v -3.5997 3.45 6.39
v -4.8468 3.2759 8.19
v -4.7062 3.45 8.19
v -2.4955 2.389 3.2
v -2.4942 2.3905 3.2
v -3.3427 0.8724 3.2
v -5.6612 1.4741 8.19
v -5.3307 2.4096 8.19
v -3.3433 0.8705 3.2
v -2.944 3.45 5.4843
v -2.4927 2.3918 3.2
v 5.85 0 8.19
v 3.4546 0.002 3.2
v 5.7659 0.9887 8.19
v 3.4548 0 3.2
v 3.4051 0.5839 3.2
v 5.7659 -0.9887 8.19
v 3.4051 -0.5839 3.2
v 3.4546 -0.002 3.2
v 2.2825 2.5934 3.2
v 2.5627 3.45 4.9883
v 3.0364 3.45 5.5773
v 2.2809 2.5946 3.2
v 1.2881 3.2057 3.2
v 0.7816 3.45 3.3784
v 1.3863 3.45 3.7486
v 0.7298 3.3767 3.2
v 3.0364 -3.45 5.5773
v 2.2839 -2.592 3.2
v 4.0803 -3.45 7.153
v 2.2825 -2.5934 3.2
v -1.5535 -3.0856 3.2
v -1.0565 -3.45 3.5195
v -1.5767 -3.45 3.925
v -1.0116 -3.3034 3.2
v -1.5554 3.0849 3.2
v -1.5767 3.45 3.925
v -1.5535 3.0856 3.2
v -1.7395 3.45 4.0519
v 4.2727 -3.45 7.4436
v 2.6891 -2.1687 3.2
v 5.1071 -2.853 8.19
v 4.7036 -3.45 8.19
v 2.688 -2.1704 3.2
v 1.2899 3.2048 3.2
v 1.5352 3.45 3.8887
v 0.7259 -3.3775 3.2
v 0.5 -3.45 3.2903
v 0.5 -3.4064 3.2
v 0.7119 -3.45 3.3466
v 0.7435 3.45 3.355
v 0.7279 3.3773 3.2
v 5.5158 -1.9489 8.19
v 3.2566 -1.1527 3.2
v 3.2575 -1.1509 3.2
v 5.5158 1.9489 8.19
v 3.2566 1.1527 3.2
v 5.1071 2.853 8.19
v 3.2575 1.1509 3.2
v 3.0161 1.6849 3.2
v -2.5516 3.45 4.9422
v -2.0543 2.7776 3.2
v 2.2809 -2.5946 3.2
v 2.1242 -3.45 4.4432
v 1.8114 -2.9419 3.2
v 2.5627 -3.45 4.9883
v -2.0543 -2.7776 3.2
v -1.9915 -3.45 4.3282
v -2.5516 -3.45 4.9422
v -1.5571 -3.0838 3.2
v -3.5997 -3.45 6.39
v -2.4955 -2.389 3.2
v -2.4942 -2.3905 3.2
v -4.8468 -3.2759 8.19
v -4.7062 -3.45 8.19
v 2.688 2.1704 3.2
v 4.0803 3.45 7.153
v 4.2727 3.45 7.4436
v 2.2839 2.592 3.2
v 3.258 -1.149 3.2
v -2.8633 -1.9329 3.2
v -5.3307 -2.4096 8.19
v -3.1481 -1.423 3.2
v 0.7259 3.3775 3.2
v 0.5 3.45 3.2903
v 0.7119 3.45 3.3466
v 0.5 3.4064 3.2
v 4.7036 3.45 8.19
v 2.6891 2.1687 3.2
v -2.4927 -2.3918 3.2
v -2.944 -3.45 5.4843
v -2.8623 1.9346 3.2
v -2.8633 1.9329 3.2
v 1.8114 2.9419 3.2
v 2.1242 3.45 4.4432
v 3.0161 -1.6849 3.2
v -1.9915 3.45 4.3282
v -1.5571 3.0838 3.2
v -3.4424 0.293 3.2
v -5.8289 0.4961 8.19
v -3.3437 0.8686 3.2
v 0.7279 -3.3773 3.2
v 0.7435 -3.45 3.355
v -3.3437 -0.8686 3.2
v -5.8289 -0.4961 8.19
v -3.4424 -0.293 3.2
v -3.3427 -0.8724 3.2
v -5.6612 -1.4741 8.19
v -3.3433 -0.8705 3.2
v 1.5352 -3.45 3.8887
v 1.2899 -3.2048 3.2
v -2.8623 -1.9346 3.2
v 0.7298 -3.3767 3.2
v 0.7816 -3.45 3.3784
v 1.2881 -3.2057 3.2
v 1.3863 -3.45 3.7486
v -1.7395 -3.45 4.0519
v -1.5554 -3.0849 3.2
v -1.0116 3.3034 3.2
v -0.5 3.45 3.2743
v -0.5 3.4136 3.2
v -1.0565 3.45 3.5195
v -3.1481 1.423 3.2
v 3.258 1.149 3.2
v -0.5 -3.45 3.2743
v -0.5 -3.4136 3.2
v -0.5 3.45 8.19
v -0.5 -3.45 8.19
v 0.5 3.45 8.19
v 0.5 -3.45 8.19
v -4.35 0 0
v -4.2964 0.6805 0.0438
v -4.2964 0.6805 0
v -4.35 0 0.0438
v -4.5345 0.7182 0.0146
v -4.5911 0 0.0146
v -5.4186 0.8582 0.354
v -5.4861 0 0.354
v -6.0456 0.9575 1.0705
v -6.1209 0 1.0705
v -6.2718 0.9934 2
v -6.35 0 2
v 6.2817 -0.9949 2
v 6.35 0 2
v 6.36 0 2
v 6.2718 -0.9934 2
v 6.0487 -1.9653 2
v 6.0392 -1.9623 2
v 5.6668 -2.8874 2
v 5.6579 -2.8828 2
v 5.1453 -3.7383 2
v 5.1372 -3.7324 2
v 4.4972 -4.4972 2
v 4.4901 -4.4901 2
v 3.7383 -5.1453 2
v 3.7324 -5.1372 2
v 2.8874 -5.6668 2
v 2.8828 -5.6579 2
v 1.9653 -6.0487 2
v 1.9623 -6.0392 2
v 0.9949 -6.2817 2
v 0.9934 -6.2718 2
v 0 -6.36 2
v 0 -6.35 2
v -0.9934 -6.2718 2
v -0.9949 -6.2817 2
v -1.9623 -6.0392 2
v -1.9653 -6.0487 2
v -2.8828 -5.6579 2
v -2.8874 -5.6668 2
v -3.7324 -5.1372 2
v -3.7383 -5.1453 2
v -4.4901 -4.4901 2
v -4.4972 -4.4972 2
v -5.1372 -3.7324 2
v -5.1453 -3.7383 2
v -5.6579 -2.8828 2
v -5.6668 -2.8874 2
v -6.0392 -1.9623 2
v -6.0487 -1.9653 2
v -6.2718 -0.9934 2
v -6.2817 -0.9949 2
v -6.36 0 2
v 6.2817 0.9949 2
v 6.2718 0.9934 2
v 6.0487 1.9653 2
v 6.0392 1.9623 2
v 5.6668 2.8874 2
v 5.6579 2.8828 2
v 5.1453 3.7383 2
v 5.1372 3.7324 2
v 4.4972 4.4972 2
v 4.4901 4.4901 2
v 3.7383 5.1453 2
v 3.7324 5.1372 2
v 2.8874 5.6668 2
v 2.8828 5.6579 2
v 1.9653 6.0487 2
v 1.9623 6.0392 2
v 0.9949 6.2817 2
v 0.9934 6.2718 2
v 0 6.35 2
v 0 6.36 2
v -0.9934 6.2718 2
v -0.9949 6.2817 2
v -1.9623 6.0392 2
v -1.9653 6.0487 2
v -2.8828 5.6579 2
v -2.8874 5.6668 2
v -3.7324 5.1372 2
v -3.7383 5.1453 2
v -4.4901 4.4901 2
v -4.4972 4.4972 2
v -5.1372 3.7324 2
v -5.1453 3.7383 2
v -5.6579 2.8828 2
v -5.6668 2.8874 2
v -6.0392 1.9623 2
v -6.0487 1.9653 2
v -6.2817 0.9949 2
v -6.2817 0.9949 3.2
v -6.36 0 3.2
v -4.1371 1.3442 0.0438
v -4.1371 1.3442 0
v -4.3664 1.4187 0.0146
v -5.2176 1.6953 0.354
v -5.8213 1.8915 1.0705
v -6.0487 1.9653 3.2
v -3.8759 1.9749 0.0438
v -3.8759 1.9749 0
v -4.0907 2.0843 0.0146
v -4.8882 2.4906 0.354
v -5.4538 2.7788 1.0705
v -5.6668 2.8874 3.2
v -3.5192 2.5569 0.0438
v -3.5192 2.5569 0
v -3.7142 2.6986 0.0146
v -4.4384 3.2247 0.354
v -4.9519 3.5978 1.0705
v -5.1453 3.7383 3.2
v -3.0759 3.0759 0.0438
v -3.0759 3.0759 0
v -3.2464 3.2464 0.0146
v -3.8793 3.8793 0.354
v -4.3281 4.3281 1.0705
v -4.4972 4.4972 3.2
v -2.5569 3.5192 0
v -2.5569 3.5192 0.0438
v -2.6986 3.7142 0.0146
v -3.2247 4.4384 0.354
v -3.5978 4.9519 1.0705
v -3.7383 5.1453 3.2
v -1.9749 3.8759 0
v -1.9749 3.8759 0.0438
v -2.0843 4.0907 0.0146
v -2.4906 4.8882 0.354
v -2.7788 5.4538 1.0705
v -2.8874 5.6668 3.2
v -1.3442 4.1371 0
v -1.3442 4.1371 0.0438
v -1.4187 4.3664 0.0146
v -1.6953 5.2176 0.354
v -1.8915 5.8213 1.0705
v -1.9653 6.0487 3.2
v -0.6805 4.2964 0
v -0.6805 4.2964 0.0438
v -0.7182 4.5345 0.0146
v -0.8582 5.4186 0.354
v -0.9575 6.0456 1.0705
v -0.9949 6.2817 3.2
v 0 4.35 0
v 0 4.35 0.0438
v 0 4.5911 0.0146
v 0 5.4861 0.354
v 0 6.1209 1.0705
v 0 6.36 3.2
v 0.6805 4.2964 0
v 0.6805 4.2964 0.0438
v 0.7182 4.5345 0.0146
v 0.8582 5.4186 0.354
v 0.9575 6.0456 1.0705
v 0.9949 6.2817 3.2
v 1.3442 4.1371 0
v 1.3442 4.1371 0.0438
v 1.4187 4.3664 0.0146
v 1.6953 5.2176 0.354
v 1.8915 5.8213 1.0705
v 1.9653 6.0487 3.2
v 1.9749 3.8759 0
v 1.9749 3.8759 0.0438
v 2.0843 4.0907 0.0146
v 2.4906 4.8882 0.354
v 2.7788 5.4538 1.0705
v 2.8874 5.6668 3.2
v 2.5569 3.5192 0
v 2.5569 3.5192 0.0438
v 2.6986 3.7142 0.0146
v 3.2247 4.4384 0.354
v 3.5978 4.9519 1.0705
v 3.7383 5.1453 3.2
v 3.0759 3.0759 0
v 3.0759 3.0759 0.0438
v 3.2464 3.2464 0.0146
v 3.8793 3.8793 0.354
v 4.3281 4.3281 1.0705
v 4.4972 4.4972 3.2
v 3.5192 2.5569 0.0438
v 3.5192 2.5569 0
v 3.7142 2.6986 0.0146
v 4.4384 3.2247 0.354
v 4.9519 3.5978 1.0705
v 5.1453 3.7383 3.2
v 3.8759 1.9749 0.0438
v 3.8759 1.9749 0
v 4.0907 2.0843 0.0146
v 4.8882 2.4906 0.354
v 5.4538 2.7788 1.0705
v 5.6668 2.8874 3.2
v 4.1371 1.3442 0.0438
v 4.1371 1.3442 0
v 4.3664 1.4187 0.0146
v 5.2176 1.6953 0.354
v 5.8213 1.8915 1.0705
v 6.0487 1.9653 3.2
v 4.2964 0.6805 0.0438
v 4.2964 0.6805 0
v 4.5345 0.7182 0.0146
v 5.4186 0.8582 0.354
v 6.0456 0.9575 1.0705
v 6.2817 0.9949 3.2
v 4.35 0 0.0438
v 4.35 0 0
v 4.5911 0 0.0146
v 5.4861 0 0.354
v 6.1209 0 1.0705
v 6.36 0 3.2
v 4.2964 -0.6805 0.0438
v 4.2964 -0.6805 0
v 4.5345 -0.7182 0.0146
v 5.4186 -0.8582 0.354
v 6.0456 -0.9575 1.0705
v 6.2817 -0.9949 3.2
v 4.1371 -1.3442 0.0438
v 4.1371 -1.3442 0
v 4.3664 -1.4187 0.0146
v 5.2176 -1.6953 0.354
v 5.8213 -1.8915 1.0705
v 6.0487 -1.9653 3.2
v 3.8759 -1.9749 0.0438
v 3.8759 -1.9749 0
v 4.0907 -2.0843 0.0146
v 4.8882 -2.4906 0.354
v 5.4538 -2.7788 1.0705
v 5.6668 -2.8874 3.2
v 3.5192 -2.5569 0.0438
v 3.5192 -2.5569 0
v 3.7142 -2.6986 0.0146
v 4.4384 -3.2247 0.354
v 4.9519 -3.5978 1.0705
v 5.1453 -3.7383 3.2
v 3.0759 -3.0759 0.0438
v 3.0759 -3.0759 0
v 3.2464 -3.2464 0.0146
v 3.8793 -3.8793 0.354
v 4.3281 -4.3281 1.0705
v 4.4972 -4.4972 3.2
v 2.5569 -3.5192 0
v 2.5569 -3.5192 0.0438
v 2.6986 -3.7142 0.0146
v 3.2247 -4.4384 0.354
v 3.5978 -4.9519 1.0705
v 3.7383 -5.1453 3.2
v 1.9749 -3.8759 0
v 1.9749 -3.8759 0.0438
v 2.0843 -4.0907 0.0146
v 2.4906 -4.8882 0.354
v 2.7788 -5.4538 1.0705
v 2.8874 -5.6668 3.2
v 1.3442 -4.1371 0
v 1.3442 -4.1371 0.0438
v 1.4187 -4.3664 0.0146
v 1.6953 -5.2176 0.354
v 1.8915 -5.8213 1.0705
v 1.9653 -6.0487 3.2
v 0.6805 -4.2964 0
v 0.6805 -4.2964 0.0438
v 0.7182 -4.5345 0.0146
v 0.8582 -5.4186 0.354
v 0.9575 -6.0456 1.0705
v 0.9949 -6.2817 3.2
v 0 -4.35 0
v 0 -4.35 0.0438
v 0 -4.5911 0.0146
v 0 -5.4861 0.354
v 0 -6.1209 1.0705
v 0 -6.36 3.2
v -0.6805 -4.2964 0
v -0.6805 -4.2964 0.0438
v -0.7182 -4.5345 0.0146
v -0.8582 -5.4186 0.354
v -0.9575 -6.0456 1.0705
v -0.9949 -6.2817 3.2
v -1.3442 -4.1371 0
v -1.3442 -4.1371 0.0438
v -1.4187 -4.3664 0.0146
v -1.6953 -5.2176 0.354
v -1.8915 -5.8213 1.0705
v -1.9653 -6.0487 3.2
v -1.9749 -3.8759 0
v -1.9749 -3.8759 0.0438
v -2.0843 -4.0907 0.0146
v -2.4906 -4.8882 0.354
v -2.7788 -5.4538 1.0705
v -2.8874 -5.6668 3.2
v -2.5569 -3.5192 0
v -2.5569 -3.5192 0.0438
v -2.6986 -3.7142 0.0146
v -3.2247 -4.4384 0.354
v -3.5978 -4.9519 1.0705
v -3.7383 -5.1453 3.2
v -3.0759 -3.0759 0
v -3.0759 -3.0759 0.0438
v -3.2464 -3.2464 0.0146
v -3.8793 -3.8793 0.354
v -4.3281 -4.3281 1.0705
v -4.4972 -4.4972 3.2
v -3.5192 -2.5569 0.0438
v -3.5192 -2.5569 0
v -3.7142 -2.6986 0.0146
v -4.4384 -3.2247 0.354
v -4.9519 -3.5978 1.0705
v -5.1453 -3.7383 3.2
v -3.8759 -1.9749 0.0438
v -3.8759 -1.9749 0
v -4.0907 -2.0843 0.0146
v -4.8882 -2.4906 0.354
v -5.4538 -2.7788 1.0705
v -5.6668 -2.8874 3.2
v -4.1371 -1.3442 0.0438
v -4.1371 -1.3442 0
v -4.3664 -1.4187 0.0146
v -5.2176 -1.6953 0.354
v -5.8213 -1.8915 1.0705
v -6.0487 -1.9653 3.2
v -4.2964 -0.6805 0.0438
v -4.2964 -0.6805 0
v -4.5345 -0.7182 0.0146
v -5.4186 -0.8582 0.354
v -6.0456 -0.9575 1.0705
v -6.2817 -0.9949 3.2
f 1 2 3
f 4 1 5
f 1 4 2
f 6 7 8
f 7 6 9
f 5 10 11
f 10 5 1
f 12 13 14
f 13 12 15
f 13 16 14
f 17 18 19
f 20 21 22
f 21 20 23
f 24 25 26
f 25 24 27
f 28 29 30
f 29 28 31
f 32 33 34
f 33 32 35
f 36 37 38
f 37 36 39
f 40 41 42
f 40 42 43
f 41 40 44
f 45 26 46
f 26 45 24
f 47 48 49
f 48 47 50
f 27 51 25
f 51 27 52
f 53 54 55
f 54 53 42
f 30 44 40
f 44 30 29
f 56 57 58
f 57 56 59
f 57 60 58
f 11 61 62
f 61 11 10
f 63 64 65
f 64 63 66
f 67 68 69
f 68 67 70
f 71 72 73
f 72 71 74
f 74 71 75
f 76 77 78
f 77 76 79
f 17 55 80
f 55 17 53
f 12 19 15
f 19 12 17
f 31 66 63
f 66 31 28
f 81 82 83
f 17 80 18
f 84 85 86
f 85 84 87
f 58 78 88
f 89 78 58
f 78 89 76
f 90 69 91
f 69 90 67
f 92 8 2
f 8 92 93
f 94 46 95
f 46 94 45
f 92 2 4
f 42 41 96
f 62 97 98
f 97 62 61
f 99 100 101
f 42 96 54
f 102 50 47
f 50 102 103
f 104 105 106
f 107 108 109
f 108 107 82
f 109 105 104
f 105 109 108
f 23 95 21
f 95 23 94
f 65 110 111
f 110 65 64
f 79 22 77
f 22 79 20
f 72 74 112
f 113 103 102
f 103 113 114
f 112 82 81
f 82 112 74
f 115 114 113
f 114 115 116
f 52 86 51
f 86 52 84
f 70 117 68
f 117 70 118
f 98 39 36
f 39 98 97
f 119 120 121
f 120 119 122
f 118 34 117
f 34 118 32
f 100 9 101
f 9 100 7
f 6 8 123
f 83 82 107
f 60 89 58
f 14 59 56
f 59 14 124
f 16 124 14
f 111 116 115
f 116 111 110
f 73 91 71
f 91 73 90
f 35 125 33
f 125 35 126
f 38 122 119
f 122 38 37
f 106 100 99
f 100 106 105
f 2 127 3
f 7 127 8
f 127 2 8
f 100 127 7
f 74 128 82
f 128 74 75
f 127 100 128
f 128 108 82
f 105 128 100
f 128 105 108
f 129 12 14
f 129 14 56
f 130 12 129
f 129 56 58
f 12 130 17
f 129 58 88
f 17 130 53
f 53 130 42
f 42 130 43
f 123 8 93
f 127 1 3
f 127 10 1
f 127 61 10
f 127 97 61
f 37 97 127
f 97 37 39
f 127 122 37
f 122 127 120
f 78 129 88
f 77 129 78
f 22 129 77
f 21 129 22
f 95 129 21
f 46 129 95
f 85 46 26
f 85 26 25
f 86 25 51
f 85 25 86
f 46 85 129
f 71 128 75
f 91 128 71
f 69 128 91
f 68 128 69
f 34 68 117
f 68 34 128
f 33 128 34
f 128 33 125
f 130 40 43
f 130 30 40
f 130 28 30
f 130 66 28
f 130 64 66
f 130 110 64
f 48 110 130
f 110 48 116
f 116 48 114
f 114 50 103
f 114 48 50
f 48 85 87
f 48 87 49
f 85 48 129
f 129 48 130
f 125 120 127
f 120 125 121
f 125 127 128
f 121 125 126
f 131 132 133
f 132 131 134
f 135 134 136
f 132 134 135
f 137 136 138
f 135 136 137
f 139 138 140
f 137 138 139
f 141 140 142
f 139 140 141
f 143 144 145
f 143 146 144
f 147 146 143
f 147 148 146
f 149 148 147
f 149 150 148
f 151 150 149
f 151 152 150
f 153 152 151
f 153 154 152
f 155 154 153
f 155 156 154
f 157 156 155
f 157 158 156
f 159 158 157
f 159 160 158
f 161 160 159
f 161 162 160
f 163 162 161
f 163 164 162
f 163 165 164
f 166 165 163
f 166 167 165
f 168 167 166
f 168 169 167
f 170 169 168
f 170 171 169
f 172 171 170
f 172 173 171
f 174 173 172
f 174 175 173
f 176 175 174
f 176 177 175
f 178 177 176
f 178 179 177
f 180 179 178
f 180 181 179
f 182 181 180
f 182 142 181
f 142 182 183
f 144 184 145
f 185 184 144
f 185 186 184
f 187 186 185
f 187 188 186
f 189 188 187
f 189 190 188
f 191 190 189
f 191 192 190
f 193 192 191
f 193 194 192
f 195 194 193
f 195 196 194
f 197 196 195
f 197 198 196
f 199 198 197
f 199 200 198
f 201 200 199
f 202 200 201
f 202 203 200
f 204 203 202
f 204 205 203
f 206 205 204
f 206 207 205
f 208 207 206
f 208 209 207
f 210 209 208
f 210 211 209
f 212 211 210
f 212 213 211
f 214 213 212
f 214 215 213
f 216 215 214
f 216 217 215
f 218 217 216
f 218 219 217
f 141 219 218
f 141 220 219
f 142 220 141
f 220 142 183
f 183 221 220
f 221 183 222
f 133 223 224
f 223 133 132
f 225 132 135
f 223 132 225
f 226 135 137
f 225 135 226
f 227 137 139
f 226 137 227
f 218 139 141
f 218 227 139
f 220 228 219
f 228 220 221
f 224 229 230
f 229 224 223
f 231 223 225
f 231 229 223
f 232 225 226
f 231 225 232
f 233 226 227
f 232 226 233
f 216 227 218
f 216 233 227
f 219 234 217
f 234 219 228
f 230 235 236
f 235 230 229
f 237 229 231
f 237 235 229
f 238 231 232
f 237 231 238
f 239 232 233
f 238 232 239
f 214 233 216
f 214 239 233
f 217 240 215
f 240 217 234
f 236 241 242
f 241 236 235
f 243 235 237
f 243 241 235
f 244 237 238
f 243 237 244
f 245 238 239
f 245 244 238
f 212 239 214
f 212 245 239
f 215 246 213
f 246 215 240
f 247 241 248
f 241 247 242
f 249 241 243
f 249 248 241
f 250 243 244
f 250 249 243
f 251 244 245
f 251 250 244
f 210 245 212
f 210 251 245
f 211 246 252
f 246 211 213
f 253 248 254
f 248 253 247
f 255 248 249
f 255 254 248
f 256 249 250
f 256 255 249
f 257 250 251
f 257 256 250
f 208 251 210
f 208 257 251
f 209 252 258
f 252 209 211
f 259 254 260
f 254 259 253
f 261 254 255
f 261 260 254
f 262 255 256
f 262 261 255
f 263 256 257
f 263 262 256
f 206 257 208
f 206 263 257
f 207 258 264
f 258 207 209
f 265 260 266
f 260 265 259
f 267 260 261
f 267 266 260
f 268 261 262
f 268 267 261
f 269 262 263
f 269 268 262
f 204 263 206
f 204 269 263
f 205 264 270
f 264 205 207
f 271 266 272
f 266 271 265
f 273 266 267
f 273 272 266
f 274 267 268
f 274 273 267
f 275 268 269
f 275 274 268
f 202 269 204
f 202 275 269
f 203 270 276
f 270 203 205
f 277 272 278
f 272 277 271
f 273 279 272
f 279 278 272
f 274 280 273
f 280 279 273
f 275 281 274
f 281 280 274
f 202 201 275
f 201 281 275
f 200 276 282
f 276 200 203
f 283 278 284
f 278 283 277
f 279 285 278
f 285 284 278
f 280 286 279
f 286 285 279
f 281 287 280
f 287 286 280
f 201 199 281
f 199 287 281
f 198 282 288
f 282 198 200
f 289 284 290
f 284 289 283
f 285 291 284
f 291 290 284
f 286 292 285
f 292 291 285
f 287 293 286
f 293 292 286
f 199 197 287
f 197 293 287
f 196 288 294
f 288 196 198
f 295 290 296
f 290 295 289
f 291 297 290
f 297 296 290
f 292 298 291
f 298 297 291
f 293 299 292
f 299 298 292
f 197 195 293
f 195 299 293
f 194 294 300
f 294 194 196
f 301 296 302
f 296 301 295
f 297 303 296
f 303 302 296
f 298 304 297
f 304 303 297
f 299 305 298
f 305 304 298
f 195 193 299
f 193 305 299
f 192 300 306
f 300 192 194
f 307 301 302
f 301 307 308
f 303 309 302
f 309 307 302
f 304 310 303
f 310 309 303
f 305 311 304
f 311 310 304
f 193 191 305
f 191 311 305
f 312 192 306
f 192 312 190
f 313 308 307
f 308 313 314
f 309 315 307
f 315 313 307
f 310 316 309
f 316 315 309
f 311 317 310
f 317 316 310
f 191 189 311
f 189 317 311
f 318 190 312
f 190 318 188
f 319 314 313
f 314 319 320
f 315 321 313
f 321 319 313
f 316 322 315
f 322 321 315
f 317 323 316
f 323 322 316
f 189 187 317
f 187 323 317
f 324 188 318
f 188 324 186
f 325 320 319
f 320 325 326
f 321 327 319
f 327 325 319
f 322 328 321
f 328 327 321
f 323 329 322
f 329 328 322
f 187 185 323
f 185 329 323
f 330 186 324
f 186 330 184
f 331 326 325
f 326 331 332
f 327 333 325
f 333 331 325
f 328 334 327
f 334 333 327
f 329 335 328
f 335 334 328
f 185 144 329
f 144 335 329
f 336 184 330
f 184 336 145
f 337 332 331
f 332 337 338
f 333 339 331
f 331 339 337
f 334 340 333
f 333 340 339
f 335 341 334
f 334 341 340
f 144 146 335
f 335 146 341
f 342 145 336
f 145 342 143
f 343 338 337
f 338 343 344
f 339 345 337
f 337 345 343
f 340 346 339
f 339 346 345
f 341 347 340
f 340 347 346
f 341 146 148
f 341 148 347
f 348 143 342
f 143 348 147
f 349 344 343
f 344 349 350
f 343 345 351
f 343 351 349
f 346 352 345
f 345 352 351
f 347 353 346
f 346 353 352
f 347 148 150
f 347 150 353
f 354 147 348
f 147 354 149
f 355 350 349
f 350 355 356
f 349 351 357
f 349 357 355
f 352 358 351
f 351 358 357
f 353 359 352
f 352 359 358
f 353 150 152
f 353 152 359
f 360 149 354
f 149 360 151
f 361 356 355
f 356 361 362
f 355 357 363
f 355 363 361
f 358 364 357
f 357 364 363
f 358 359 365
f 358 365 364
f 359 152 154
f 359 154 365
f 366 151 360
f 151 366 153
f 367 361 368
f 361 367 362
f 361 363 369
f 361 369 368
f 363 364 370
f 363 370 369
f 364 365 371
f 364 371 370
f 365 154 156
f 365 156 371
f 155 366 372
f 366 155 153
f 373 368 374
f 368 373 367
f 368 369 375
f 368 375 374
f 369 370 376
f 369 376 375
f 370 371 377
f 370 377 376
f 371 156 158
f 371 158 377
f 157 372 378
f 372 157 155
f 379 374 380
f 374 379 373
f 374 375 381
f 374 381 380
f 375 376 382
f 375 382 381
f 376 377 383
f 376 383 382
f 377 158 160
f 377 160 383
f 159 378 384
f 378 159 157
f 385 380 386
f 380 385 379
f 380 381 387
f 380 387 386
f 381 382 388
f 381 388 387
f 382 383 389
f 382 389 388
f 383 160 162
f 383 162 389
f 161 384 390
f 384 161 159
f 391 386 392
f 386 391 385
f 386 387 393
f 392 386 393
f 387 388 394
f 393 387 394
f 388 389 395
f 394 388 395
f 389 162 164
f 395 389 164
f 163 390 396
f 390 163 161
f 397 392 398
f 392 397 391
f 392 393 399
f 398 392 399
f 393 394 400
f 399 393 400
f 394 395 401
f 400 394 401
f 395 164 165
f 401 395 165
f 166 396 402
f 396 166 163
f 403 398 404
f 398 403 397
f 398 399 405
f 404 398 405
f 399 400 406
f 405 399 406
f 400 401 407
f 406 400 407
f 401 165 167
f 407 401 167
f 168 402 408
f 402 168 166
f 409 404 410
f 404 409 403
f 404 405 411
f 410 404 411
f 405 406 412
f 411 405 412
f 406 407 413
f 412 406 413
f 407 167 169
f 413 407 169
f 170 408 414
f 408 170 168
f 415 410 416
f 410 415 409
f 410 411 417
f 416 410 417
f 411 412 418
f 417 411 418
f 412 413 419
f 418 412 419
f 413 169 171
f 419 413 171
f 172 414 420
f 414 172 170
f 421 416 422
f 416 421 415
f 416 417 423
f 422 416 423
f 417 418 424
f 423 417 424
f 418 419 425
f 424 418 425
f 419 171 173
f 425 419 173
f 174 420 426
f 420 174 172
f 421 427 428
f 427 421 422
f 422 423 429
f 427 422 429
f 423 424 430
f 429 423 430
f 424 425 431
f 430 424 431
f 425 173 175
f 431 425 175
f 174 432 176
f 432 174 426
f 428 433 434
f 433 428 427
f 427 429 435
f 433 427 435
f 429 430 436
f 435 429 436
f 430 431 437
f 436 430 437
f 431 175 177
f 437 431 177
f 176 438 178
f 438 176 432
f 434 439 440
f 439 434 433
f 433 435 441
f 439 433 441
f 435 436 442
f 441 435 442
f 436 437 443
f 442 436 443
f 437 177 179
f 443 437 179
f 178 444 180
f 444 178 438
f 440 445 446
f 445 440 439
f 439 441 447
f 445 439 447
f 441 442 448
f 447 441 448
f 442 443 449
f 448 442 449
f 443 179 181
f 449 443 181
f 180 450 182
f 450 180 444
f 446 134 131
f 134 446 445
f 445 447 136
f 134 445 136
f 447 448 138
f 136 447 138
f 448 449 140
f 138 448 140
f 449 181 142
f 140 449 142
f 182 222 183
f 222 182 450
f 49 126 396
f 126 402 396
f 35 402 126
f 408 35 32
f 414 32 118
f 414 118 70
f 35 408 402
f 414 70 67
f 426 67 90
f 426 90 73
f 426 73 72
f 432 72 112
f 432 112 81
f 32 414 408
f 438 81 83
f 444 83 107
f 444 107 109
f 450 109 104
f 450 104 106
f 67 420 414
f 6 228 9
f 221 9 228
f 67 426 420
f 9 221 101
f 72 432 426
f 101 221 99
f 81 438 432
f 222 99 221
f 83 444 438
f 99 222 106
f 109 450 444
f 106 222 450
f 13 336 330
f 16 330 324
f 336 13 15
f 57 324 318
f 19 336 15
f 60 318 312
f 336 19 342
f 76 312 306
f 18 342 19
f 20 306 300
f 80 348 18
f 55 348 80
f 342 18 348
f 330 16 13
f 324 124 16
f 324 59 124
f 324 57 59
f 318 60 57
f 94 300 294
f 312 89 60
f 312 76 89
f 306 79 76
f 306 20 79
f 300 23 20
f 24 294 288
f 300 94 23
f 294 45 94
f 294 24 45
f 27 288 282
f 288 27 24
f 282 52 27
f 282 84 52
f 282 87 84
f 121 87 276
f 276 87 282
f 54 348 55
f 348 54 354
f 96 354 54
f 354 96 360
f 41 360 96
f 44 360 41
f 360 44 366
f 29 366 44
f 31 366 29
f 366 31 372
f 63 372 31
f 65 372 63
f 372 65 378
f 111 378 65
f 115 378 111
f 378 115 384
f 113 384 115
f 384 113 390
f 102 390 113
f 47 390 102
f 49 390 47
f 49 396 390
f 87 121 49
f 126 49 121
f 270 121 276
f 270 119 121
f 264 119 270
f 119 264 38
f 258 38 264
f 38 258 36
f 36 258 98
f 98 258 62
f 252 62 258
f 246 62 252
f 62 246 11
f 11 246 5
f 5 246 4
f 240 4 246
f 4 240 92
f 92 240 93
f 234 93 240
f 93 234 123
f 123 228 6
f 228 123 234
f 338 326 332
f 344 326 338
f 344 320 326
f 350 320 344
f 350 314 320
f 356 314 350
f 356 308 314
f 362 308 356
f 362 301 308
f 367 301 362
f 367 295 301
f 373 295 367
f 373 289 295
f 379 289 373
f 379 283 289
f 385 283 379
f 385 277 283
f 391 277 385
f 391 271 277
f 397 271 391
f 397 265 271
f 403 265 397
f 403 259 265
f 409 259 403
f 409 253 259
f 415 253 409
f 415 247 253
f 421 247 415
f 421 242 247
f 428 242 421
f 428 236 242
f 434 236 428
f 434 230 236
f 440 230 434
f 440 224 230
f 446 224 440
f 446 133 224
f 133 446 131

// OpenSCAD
// -*- mode: SCAD ; c-file-style: "ellemtel" ; coding: utf-8 -*-
//
// NN
//
// Copyright 2018 - 2019 Roland Sieker <ospalh@gmail.com>
// Licence: CC-BY-SA 4.0

/* [Global] */


// Set this to "render" and click on "Create Thing" when done with the setup.
preview = 1; // [0:render, 1:preview]

/* [Sizes] */

// Outer diameter of tube (mm)
diameter = 12.7;  // [5:0.1:40]

// Thickness of the tube wall
wall = 0.9;   // [0.4:0.1:5]

/* [Hidden] */

// Done with the customizer

// *******************************************************
// Extra parameters. These can be changed reasonably safely.


// w = 1.8;  // Wall width
p = 1.2;  // Bottom, top plate hight
c = 0.4;  // Clearance

gap = 1;  // The central gap for the two plug/clamp arms
cgap = 2; // Cylinder gap
r_r = 2;  // Rounding radius. Reduce this for tubes < ~ 5mm
h_p = 5;  // hight of the plug bit

// *******************************************************
// Some shortcuts. These shouldn't be changed

tau = 2 * PI;  // pi is still wrong. tau = circumference / r



some_distance = 50;
ms = 0.01;  // Muggeseggele.

r_m = diameter/2;  // main radius
r_red = r_m - r_r;  // reduced radius of the visible cap

r_pm = r_m - wall + c; // main radius of the plug
r_pb = r_m -wall - cgap;

// fn for differently sized objects and fs, fa; all for preview or rendering.
pna = 40;
pnb = 15;
pa = 5;
ps = 1;
rna = 180;
rnb = 30;
ra = 2;
rs = 0.25;
function na() = (preview) ? pna : rna;
function nb() = (preview) ? pnb : rnb;
$fs = (preview) ? ps : rs;
$fa = (preview) ? pa : ra;

// *******************************************************
// End setup



// *******************************************************
// Generate the parts

endcap();
//2d_vcap();
// %visible_cap();
// #plug();
// ground_plug();

// *******************************************************
// Code for the parts themselves


module endcap()
{
   visible_cap();
   plug();
}


module visible_cap()
{
   rotate_extrude()
   {
      2d_vcap();
   }
}

module 2d_vcap()
{
   square([r_red, r_r]);
   intersection()
   {
      translate([r_red, r_r])
      {
         circle(r_r);
      }
      translate([0,0,-ms])
      {
         square([r_m+ms, r_r+2*ms]);
      }
   }
   translate([0, r_r])
   {
      square([r_m+ms, p]);
   }
}

module plug()
{
   translate([0,0,r_r+p-ms])
   {
      ground_plug();
   }
}


module ground_plug()
{
   difference()
   {
   intersection()
   {
      cylinder(r1=r_pb, r2=r_pm, h=h_p);
      cube([diameter, 2*r_pb, 3*r_m], center=true);
   }
   cube([gap, diameter, 3*r_m], center=true);
   }
}
